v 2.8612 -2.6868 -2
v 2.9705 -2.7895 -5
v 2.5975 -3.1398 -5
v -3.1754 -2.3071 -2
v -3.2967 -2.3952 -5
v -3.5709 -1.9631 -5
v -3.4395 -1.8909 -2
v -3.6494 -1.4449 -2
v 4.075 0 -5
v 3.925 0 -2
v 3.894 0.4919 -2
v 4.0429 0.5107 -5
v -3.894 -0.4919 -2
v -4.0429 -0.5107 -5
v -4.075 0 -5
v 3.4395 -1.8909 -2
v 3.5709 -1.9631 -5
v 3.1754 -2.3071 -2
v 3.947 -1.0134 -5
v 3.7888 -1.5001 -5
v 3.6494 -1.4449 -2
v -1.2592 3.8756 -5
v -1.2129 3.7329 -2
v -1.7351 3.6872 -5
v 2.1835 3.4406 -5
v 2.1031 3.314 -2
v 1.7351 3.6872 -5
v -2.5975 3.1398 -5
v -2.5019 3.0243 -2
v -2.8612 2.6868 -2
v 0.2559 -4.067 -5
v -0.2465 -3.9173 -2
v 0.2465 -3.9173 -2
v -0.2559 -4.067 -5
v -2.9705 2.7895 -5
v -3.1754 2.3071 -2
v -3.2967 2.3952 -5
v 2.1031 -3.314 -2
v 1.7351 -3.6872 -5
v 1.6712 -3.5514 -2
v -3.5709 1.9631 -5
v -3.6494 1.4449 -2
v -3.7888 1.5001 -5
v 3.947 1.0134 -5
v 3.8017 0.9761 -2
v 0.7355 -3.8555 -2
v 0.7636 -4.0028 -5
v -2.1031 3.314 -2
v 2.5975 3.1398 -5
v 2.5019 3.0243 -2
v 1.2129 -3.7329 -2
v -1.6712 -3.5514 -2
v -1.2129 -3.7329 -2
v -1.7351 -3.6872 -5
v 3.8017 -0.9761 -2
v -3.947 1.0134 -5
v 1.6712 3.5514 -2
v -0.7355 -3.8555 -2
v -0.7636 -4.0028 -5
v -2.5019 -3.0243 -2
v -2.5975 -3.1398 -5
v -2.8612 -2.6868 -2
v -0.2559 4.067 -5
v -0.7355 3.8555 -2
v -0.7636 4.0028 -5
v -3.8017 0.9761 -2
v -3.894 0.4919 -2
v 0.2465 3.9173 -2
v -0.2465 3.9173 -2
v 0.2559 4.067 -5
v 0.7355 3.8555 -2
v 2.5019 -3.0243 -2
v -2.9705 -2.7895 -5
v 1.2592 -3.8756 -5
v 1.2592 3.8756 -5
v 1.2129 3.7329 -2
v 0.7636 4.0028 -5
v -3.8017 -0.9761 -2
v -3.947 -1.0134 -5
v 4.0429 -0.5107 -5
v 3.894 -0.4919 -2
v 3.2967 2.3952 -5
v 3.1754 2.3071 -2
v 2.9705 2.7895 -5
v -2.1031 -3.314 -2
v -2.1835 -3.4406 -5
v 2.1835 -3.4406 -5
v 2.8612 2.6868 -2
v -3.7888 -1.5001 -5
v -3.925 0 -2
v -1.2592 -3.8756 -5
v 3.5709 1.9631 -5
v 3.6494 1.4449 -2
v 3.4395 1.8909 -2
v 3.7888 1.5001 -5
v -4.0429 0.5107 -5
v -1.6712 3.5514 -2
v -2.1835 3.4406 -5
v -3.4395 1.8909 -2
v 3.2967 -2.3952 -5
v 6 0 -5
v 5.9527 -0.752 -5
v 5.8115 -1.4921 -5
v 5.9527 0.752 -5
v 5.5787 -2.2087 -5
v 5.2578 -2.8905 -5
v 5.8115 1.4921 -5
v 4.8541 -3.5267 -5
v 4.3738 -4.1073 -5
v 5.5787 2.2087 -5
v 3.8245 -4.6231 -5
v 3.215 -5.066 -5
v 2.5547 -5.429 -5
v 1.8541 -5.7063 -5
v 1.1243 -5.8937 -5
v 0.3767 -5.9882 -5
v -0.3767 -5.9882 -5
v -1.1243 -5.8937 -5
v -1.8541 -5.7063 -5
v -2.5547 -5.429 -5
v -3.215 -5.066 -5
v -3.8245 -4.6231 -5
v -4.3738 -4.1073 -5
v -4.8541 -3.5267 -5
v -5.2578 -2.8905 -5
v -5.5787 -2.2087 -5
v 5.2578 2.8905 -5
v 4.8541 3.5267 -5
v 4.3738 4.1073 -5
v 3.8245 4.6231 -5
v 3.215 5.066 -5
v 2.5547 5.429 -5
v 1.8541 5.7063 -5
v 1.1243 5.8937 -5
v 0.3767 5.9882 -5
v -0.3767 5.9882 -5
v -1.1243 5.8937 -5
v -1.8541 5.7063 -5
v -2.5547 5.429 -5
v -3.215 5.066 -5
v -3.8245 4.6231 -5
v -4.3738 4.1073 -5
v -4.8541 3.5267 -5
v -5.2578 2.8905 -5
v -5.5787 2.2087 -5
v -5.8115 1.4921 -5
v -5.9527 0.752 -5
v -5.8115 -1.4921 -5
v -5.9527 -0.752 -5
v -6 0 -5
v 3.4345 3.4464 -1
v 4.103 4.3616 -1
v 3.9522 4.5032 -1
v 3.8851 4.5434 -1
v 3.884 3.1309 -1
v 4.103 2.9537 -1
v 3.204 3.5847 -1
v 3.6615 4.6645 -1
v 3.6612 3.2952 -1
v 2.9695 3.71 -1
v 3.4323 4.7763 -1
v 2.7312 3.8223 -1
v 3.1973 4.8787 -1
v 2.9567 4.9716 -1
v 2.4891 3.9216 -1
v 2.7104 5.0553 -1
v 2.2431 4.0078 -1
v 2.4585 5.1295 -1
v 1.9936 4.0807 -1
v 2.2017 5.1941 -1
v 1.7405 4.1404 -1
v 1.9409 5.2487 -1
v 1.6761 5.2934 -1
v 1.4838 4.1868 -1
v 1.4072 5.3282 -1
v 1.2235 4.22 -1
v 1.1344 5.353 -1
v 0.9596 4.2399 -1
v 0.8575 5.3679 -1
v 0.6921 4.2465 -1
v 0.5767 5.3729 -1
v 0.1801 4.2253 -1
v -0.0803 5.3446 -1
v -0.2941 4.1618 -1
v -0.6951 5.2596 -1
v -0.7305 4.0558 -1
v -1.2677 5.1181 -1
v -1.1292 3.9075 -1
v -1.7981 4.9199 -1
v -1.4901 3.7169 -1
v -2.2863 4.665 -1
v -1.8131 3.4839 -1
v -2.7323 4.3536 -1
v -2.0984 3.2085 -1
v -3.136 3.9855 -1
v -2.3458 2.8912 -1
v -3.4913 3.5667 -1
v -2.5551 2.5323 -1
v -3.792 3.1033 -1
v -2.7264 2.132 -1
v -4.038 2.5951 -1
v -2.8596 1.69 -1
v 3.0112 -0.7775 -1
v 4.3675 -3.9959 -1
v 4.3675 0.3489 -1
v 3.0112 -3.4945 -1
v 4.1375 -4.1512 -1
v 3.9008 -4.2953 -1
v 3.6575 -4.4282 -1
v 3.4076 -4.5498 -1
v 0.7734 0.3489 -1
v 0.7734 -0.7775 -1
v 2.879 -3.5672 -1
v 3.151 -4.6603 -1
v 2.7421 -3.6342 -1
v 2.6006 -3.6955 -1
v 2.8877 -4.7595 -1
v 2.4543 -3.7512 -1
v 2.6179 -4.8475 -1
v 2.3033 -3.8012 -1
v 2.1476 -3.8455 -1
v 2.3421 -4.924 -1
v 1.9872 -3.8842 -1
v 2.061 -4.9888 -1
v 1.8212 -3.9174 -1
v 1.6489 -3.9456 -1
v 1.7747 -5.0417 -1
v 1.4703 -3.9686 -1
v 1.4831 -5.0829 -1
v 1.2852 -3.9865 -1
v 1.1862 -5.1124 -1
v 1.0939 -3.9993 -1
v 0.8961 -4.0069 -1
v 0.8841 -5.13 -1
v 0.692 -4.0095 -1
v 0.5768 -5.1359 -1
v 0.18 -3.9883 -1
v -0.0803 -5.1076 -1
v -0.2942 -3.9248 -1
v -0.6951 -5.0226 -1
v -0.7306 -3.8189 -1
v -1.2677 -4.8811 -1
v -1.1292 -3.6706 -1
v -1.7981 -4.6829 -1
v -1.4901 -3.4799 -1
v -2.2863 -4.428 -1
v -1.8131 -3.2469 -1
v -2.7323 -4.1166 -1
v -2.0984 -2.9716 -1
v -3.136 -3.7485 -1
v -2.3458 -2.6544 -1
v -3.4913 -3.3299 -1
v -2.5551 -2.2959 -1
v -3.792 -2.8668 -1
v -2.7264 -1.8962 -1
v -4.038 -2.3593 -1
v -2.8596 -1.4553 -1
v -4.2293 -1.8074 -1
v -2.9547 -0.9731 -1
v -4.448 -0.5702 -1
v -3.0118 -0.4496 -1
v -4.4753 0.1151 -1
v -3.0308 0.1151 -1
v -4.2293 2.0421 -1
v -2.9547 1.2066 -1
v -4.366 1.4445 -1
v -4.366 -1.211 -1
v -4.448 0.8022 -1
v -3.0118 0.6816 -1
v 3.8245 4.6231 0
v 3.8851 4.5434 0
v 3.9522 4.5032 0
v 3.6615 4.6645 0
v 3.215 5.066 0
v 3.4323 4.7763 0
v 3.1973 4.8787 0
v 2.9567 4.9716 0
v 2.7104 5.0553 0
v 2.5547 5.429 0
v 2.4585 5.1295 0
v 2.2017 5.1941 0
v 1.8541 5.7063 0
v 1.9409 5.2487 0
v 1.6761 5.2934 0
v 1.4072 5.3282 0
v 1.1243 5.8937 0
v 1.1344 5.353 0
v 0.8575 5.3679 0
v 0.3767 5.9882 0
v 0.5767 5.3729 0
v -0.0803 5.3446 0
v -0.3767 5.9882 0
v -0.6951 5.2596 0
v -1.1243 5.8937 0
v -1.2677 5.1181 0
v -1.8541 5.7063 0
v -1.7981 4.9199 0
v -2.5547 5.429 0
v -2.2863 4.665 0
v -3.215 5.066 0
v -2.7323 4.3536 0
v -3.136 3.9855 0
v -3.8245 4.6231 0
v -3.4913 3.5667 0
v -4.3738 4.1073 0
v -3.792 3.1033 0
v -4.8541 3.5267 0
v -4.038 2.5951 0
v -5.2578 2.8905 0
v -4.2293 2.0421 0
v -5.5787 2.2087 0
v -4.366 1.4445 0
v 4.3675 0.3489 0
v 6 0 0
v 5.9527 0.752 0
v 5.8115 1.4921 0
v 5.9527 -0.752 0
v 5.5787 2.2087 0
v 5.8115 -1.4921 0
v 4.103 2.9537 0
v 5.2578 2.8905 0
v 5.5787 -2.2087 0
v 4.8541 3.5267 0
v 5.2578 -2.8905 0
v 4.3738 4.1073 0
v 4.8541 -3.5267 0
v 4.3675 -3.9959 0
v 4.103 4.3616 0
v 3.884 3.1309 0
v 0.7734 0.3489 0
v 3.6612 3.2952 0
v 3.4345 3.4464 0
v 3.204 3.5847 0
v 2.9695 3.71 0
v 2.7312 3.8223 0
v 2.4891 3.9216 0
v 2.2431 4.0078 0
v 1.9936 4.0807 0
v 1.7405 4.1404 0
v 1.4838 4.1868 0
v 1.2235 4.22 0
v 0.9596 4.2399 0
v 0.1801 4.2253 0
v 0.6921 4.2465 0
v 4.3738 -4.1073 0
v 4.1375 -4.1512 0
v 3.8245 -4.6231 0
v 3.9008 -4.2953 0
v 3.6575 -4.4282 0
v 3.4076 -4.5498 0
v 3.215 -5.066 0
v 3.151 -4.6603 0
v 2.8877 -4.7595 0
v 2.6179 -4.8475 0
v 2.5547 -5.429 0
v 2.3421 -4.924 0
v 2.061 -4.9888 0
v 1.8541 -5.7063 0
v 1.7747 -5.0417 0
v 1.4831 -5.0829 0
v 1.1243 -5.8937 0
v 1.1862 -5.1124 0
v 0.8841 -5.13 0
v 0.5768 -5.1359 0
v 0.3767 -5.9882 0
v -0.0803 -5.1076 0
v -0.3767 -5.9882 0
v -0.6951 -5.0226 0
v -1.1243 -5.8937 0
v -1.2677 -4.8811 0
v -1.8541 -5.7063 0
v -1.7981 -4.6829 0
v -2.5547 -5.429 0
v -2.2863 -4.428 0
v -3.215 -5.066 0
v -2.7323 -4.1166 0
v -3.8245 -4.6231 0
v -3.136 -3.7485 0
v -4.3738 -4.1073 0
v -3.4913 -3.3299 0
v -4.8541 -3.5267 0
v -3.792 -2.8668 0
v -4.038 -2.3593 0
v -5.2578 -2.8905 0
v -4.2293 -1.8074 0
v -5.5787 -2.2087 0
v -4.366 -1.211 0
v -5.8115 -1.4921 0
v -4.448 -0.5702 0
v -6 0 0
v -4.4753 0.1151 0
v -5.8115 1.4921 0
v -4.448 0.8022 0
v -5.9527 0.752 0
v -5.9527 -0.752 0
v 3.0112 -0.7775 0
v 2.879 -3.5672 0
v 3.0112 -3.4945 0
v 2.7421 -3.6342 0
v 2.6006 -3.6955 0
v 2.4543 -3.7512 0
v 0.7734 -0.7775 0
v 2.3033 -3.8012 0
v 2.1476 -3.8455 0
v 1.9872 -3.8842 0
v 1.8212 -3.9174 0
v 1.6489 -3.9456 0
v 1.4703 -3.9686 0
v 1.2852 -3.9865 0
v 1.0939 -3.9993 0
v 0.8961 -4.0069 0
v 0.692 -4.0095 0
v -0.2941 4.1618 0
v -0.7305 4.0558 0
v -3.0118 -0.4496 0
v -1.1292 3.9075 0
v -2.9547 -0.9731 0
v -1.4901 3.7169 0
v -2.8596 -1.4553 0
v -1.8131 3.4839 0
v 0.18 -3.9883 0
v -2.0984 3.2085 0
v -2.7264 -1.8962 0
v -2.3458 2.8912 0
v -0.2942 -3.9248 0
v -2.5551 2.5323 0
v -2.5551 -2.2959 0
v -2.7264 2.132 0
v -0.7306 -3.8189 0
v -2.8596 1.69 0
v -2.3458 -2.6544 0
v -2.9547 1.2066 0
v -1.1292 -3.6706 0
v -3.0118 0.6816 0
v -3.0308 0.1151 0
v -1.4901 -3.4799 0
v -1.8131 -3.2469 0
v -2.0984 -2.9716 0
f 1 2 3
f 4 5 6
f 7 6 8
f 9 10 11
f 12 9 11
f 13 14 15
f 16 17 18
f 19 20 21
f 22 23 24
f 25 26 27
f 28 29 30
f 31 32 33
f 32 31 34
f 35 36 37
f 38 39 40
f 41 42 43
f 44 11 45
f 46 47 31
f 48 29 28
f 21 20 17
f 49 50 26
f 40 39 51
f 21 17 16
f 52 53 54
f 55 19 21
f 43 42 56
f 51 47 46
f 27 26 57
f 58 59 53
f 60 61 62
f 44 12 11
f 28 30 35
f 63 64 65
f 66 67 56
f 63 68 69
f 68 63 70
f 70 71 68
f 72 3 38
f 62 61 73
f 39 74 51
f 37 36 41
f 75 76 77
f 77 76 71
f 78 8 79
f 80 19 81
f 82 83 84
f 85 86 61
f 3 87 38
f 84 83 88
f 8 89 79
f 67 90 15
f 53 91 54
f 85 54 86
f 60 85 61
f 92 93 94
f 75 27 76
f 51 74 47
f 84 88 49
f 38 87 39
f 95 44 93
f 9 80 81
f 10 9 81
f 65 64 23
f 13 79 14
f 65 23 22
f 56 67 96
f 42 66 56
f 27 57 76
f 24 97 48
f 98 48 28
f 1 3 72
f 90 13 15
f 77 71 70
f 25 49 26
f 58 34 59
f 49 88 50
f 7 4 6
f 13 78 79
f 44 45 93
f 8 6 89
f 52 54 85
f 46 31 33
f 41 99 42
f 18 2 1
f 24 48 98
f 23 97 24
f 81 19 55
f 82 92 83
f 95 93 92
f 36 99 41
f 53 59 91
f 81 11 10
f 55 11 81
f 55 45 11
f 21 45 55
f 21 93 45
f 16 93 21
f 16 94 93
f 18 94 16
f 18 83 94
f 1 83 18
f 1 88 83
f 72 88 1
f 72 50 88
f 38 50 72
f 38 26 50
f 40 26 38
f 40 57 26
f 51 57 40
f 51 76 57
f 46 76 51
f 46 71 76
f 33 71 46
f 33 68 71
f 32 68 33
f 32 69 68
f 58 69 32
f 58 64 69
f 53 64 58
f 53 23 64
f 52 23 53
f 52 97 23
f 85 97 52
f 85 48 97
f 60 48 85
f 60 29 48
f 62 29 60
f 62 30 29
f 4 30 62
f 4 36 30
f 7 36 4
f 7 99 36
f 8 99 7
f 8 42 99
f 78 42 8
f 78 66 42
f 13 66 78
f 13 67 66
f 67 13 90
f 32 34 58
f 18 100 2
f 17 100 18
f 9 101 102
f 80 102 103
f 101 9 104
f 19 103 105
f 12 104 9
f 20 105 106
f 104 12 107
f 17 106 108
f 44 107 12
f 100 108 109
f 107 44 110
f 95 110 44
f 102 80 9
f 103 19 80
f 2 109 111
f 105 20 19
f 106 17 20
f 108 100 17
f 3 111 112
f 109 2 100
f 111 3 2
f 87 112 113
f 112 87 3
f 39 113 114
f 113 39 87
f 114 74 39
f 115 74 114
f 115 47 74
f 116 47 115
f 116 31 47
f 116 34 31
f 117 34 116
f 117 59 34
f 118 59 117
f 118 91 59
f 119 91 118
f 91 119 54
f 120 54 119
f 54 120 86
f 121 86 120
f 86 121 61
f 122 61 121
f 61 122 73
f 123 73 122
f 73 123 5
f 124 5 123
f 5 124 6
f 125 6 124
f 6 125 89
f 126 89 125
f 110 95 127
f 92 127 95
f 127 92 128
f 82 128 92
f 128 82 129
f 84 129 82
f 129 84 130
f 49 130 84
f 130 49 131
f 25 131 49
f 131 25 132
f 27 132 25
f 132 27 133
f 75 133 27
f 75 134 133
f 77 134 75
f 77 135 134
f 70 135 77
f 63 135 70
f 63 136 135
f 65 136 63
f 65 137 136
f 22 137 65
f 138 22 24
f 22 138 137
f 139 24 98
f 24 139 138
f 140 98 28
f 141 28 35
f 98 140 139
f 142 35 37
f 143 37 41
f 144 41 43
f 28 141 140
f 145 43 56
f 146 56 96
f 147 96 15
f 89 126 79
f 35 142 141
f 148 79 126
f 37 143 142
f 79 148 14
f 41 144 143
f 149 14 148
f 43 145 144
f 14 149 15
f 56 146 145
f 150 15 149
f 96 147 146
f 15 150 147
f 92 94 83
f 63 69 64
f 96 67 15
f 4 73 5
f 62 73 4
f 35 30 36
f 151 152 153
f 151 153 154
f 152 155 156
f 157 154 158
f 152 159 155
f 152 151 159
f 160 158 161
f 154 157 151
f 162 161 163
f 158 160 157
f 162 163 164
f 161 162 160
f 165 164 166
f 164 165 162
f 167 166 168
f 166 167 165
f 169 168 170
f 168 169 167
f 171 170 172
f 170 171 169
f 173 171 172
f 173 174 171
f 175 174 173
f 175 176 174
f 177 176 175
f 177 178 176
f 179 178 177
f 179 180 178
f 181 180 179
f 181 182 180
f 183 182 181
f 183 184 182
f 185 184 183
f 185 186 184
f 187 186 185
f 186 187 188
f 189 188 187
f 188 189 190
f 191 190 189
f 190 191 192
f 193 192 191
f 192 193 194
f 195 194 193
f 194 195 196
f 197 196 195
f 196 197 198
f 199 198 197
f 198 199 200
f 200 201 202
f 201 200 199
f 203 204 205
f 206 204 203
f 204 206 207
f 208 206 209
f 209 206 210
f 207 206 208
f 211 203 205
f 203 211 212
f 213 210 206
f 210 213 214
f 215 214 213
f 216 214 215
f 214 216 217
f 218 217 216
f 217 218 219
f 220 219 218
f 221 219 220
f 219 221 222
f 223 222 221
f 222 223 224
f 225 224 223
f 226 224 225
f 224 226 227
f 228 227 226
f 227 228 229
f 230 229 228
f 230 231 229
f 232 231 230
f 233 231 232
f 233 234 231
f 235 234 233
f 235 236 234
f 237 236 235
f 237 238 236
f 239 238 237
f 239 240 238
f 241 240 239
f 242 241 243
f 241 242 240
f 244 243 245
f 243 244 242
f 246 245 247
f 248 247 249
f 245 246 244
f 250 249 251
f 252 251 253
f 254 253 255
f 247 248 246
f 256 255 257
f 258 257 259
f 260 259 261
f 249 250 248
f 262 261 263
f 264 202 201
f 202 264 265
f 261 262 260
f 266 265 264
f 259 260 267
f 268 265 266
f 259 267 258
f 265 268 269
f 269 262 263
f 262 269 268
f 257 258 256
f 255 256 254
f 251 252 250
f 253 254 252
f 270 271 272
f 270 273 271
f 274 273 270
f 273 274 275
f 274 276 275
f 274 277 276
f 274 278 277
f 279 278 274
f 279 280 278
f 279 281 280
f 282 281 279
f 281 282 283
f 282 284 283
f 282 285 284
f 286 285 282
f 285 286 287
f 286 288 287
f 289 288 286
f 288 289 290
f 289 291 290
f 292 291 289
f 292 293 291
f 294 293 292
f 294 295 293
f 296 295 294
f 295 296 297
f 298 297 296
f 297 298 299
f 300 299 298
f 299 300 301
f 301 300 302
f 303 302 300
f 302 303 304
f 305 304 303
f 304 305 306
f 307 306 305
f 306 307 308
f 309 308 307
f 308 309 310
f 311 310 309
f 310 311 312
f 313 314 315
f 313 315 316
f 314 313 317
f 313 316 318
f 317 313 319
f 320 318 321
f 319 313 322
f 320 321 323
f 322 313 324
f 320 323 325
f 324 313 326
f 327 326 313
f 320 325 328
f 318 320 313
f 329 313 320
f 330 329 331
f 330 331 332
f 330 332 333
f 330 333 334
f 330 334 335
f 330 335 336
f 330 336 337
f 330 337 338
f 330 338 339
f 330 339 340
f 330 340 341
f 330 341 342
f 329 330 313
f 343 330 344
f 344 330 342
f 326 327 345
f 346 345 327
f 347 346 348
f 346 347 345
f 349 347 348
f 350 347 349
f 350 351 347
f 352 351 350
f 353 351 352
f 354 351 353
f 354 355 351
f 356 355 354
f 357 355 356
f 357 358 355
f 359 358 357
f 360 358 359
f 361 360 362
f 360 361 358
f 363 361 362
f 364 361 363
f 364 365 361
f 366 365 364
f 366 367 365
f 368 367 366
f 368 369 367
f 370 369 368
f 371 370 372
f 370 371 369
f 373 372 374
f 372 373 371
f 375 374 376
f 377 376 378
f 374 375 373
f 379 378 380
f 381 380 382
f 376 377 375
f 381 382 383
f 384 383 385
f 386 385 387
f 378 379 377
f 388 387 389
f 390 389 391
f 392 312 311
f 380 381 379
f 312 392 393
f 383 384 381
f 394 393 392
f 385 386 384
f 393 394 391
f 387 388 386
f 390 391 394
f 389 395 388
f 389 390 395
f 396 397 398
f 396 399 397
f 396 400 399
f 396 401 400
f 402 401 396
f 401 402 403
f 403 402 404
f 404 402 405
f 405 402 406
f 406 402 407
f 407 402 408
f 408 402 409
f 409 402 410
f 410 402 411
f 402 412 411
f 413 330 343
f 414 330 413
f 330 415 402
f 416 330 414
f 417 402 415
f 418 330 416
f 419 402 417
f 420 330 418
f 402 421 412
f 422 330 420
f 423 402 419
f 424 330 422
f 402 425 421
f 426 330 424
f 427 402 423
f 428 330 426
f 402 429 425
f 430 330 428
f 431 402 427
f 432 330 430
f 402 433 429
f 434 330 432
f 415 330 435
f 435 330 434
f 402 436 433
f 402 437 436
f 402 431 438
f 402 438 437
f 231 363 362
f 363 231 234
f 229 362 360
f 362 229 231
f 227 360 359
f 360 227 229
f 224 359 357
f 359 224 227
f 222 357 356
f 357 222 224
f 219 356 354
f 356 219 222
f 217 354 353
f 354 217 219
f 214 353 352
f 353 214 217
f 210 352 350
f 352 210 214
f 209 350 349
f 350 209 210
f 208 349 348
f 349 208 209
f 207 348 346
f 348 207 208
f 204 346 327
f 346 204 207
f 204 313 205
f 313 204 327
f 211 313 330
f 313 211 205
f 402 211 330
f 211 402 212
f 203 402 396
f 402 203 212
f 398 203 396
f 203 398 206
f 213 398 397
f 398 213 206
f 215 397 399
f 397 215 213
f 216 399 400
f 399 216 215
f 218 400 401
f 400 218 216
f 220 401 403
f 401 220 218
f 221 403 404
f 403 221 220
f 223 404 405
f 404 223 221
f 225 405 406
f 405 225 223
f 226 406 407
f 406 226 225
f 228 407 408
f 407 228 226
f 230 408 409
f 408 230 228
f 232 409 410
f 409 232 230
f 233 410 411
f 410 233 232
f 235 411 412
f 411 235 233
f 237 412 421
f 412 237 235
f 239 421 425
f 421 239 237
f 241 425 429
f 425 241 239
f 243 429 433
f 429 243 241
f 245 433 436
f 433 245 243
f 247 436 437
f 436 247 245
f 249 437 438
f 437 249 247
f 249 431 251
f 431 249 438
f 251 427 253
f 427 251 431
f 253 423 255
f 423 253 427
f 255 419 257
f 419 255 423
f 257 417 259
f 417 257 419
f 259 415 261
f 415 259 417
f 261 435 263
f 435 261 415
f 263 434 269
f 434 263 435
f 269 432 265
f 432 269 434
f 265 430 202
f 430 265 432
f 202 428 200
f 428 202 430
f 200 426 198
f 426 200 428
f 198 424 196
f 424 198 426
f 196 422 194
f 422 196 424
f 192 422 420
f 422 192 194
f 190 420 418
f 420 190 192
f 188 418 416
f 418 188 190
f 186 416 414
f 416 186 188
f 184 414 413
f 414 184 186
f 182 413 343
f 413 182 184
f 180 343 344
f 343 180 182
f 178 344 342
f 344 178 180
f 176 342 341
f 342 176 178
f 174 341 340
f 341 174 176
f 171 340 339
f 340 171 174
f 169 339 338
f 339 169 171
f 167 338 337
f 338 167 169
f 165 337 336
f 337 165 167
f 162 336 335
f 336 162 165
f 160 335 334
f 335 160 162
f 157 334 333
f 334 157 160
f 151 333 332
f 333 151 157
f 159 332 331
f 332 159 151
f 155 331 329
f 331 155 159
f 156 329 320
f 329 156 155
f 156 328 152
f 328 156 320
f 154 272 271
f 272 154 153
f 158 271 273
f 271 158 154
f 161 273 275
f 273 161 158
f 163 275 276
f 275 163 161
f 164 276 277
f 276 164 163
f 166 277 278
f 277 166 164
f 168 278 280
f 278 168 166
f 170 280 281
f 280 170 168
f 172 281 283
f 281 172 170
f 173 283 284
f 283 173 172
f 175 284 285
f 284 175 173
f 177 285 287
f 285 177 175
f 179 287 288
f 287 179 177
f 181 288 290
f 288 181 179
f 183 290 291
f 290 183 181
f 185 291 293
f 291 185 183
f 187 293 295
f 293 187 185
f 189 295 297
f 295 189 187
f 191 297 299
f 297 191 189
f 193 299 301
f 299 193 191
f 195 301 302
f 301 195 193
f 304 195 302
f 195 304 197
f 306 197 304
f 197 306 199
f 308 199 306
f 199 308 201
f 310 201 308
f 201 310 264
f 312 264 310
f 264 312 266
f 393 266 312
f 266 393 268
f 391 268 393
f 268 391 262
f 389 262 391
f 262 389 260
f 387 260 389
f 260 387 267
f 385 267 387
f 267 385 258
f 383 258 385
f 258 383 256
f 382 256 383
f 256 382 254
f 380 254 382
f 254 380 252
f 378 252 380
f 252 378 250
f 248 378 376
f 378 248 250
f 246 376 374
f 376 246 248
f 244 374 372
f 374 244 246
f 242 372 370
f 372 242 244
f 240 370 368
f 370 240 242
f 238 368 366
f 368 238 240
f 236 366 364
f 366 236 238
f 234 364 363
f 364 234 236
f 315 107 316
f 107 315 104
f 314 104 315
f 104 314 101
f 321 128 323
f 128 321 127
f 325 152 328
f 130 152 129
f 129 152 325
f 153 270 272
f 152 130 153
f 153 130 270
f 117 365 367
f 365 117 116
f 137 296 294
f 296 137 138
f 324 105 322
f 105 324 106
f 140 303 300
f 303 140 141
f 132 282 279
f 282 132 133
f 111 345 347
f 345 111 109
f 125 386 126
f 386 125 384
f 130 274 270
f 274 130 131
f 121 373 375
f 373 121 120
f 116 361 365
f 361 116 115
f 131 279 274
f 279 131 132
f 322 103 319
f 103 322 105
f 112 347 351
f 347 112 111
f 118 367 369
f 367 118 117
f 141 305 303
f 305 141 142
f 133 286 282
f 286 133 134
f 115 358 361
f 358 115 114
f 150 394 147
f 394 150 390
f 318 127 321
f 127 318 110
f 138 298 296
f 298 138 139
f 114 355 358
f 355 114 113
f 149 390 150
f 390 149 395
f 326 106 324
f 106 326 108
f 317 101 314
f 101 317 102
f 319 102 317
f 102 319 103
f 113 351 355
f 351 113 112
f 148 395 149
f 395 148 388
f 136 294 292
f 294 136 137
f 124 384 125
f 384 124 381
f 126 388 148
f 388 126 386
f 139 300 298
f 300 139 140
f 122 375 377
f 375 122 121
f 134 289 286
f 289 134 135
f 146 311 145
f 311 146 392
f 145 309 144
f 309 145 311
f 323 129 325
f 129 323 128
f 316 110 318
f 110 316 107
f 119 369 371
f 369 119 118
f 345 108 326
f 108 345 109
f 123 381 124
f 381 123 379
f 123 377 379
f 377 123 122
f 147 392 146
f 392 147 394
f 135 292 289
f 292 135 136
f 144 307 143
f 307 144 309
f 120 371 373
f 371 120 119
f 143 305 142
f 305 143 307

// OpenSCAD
$fn = 50;

difference() {
	union() {
		translate(v = [0, 0, -5.0]) {
			cylinder(h = 5, r = 6.0);
		}
	}
	union() {
		#translate(v = [0, 0, -5.0]) {
			cylinder(h = 3, r1 = 4.075, r2 = 3.925);
		}
		translate(v = [0, 0, -1]) {
			linear_extrude(height = 1) {
				text(font = "Impact", halign = "center", size = 10, text = "G", valign = "center");
			}
		}
	}
}
